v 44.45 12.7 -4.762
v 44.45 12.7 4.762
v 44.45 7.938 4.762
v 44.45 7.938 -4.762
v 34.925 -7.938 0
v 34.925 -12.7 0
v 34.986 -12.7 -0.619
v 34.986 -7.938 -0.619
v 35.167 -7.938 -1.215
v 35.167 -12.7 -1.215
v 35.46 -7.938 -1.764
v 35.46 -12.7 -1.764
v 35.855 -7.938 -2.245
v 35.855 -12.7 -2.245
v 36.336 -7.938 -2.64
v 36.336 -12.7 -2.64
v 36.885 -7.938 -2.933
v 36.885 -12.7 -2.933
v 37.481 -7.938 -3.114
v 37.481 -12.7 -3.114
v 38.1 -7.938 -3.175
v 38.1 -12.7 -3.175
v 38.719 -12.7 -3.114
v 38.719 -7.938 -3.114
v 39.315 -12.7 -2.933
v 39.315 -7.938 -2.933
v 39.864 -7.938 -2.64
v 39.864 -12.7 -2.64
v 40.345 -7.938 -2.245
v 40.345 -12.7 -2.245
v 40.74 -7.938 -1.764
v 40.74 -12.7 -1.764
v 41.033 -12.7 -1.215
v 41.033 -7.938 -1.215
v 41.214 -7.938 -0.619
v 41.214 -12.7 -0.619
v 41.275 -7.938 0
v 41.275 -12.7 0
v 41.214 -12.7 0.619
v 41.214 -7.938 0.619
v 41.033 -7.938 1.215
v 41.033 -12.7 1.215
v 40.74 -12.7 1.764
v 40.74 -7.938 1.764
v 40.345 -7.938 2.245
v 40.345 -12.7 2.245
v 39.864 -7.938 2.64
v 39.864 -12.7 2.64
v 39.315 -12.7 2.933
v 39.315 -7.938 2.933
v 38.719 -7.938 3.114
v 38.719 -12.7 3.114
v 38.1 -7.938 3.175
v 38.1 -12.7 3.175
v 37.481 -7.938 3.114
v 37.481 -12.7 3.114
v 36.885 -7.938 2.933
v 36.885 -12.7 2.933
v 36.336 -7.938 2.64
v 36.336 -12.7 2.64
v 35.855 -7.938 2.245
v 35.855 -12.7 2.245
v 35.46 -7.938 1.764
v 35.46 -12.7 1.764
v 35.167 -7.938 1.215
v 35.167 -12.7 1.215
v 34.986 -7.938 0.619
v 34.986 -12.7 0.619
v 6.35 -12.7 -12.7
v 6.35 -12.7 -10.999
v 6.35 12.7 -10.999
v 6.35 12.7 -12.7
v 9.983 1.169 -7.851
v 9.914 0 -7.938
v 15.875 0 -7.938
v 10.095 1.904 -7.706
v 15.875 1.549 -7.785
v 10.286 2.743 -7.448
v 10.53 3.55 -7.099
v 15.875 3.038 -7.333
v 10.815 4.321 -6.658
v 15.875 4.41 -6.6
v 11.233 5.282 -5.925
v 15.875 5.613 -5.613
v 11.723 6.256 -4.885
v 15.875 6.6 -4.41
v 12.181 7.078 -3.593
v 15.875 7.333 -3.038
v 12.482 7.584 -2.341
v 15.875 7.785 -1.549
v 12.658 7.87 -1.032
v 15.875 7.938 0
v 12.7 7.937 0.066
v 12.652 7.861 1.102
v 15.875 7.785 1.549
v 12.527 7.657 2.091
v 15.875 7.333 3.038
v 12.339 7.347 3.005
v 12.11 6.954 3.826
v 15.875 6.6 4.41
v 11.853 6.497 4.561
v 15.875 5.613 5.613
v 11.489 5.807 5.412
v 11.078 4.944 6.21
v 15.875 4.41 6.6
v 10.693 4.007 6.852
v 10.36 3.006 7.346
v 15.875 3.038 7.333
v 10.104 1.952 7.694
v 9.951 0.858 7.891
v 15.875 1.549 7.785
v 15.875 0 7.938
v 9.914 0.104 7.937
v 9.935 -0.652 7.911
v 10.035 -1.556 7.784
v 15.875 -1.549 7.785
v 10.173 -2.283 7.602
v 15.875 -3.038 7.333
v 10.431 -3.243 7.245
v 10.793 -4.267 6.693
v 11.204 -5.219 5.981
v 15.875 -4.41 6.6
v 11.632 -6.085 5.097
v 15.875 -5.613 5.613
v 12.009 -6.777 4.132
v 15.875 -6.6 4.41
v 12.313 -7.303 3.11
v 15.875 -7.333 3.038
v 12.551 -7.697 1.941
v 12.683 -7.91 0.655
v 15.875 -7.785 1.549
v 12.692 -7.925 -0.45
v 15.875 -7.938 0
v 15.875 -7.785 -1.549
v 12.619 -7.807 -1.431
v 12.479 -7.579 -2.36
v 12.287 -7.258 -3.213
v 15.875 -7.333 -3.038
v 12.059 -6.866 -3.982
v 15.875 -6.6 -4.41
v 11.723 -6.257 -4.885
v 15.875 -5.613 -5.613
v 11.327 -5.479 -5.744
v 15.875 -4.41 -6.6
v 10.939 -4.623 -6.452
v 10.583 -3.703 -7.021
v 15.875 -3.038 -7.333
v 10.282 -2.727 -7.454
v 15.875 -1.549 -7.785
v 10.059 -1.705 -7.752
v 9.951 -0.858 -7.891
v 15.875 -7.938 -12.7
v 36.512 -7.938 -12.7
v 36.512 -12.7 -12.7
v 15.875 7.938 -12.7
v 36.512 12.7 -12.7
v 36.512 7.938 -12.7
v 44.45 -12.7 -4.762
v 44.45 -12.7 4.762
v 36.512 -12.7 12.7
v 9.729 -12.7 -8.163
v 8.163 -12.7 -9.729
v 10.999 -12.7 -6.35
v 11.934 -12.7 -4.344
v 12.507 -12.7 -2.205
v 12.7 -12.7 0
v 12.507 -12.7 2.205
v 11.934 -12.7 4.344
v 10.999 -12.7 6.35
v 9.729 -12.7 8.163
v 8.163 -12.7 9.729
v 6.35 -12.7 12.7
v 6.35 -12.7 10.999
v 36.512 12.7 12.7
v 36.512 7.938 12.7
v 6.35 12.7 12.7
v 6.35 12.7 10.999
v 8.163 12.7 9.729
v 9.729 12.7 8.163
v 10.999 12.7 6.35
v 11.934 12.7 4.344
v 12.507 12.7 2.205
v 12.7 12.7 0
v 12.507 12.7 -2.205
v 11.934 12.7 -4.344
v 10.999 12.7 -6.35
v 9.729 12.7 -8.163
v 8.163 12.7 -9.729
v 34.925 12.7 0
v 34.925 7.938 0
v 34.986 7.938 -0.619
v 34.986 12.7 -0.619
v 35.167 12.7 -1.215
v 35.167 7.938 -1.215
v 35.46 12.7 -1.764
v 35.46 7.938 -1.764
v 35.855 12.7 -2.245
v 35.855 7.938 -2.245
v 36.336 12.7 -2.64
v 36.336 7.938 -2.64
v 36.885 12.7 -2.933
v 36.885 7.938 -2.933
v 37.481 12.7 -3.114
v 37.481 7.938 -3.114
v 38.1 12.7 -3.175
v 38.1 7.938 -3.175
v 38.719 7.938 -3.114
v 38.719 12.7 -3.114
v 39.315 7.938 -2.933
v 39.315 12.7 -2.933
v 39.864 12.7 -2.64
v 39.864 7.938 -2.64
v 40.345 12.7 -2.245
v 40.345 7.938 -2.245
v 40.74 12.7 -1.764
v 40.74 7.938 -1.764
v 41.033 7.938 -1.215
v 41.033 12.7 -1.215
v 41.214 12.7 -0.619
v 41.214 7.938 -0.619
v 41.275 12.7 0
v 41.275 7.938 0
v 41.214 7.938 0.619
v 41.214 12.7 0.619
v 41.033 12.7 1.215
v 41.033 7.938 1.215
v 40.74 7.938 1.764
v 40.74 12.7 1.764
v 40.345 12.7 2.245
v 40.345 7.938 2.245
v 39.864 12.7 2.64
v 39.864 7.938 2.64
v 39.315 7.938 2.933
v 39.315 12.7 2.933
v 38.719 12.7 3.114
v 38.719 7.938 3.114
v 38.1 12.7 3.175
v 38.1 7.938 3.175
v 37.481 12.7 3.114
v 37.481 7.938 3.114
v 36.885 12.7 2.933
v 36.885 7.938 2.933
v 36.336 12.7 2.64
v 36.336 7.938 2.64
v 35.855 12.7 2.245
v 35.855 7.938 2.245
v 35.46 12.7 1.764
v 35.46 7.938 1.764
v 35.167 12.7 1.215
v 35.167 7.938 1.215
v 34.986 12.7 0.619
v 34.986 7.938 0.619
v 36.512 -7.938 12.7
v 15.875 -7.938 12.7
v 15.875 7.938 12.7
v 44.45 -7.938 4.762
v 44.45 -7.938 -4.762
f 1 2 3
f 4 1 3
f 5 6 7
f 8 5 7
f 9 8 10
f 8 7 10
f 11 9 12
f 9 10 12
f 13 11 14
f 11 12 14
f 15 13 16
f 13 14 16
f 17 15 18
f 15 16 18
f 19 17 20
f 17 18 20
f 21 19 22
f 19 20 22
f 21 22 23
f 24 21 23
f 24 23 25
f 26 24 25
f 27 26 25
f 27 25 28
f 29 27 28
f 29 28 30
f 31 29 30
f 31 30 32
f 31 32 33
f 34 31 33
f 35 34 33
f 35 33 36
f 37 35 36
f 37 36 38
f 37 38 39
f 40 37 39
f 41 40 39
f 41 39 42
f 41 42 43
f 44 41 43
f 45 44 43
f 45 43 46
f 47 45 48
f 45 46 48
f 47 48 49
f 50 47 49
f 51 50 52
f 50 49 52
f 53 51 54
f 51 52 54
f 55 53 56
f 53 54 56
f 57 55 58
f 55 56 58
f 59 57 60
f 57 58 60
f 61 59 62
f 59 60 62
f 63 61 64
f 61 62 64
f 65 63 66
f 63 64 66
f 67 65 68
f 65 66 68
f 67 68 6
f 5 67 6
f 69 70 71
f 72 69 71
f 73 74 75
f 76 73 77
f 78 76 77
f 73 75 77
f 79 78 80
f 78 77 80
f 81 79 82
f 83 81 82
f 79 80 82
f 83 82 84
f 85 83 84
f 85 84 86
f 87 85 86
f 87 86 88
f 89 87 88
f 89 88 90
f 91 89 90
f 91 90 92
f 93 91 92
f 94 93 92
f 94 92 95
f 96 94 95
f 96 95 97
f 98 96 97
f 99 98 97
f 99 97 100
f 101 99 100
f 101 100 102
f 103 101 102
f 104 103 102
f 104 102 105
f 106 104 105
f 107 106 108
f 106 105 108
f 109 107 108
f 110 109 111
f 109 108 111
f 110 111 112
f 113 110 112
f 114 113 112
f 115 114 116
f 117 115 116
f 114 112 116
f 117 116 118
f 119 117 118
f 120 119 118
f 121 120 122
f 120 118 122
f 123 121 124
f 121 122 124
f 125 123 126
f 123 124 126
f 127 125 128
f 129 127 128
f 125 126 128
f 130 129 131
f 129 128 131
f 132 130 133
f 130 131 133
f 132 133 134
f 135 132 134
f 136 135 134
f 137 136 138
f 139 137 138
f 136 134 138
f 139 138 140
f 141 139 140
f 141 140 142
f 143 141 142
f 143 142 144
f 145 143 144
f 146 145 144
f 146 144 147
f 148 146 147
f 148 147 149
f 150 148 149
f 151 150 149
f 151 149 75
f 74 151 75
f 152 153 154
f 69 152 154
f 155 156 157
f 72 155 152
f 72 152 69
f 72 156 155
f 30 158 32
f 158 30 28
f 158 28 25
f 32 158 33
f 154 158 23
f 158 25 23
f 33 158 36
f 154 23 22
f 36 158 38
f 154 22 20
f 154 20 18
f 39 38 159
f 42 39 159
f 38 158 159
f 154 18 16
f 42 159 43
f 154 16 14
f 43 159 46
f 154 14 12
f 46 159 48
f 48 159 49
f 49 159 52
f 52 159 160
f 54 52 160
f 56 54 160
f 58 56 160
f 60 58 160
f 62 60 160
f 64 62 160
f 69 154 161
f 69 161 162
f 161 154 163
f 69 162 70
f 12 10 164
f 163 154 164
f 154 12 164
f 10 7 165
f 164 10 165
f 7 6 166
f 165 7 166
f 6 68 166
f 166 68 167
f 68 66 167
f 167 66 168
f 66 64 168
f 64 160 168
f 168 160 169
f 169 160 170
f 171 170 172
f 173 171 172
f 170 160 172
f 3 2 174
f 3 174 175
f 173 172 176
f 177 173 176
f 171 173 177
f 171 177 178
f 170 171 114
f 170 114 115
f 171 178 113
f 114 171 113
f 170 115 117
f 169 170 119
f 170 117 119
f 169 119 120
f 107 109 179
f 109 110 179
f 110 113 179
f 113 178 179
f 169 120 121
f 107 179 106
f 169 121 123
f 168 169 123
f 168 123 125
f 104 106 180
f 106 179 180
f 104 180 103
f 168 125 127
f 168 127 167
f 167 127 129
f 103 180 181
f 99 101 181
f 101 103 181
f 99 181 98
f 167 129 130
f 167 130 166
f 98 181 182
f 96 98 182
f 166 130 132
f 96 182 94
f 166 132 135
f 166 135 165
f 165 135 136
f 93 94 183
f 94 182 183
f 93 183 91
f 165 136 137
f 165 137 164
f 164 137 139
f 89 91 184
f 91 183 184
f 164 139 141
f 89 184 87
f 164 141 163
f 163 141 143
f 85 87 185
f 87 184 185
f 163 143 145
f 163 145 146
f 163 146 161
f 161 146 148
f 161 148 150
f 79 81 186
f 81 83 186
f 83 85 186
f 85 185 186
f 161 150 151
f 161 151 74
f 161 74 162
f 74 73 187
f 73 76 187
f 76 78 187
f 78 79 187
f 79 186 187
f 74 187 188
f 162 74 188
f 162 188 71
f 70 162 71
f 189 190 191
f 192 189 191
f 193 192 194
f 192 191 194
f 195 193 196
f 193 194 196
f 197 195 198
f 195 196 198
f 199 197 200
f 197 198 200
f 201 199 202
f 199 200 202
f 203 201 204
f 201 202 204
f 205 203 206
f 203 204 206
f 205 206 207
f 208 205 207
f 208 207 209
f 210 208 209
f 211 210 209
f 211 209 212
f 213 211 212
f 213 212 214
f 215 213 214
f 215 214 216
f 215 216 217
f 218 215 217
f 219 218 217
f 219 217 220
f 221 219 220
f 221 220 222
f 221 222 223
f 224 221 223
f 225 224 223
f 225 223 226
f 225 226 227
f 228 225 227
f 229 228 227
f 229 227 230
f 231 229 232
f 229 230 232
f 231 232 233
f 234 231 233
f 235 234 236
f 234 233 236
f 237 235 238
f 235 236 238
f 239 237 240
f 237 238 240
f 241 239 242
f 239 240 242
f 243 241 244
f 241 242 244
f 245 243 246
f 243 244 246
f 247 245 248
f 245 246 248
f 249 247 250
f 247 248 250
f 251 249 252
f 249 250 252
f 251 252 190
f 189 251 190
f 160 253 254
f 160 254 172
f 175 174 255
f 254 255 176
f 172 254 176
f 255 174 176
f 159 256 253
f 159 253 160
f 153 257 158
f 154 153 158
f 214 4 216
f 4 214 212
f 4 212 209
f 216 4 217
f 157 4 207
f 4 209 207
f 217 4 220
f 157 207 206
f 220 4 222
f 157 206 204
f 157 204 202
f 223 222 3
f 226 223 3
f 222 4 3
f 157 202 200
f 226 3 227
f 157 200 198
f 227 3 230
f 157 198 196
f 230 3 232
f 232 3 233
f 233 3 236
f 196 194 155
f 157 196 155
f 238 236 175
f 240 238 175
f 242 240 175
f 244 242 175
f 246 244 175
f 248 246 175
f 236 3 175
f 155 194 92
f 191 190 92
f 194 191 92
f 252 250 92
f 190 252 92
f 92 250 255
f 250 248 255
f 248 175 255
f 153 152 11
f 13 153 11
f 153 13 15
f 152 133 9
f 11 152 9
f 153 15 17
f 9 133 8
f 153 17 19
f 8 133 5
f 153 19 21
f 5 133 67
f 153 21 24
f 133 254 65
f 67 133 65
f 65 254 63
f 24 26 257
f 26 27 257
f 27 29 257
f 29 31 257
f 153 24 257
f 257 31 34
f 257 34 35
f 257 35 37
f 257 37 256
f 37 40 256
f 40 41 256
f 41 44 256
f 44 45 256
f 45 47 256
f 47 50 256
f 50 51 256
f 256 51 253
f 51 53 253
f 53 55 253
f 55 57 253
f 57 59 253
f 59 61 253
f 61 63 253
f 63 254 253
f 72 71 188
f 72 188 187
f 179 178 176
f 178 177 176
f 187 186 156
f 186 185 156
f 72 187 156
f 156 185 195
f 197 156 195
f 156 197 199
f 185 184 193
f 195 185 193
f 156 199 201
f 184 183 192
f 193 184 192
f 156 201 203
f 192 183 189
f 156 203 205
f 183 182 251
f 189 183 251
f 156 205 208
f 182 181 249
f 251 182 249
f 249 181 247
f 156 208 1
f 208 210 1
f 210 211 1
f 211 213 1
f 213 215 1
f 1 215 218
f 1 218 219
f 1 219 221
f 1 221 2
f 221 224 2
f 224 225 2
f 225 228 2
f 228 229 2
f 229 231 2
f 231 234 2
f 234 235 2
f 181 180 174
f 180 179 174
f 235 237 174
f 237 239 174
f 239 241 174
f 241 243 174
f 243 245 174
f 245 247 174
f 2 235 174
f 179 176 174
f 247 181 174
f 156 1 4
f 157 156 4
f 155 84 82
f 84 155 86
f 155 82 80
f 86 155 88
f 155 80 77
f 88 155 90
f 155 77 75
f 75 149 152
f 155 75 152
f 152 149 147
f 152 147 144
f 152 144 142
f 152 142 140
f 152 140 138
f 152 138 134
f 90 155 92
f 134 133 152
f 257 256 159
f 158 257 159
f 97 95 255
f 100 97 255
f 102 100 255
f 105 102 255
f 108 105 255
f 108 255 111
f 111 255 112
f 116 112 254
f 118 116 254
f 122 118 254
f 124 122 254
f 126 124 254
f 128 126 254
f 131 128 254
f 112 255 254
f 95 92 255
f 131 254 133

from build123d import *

# Parameters (mm, degrees)
BOSS_EXTRUDE1_DEPTH         = 12.7
F_1_4_0_25_DIAMETER_HOLE1_D = 6.35
CHAMFER1_SIZE               = 7.9375
SKETCH6_R                   = 7.9375
CUT_EXTRUDE1_DEPTH          = 10.525
SKETCH7_R                   = 12.7
CUT_EXTRUDE2_DEPTH          = 26.4


with BuildPart() as part:
    # Sketch1 → Boss-Extrude1 (new body, symmetric)
    with BuildSketch(Plane.XY):
        Polygon((6.35, 12.7), (44.45, 12.7), (44.45, 7.9375), (15.875, 7.9375), (15.875, -7.9375), (44.45, -7.9375), (44.45, -12.7), (6.35, -12.7), align=None)
    extrude(amount=BOSS_EXTRUDE1_DEPTH, both=True)

    # 1/4 (0.25) Diameter Hole1 (through all)
    with Locations(Plane(origin=(0, 12.7, 0), x_dir=(1, 0, 0), z_dir=(0, 1, 0))):
        with Locations((38.1, 0)):
            Hole(F_1_4_0_25_DIAMETER_HOLE1_D / 2)

    # Chamfer1
    chamfer1_edges = [part.edges().sort_by_distance(p)[0] for p in [
        (44.45, 10.31875, 12.7),
        (44.45, -10.31875, 12.7),
        (44.45, -10.31875, -12.7),
        (44.45, 10.31875, -12.7),
    ]]
    chamfer(chamfer1_edges, length=CHAMFER1_SIZE)

    # Sketch6 → Cut-Extrude1 (cut, through all)
    with BuildSketch(Plane(origin=(15.875, 0, 0), x_dir=(0, 0, -1), z_dir=(1, 0, 0))):
        Circle(SKETCH6_R)
    extrude(amount=-CUT_EXTRUDE1_DEPTH, mode=Mode.SUBTRACT)

    # Sketch7 → Cut-Extrude2 (cut, through all)
    with BuildSketch(Plane(origin=(0, 12.7, 0), x_dir=(1, 0, 0), z_dir=(0, 1, 0))):
        Circle(SKETCH7_R)
    extrude(amount=-CUT_EXTRUDE2_DEPTH, mode=Mode.SUBTRACT)


solid = part.part
